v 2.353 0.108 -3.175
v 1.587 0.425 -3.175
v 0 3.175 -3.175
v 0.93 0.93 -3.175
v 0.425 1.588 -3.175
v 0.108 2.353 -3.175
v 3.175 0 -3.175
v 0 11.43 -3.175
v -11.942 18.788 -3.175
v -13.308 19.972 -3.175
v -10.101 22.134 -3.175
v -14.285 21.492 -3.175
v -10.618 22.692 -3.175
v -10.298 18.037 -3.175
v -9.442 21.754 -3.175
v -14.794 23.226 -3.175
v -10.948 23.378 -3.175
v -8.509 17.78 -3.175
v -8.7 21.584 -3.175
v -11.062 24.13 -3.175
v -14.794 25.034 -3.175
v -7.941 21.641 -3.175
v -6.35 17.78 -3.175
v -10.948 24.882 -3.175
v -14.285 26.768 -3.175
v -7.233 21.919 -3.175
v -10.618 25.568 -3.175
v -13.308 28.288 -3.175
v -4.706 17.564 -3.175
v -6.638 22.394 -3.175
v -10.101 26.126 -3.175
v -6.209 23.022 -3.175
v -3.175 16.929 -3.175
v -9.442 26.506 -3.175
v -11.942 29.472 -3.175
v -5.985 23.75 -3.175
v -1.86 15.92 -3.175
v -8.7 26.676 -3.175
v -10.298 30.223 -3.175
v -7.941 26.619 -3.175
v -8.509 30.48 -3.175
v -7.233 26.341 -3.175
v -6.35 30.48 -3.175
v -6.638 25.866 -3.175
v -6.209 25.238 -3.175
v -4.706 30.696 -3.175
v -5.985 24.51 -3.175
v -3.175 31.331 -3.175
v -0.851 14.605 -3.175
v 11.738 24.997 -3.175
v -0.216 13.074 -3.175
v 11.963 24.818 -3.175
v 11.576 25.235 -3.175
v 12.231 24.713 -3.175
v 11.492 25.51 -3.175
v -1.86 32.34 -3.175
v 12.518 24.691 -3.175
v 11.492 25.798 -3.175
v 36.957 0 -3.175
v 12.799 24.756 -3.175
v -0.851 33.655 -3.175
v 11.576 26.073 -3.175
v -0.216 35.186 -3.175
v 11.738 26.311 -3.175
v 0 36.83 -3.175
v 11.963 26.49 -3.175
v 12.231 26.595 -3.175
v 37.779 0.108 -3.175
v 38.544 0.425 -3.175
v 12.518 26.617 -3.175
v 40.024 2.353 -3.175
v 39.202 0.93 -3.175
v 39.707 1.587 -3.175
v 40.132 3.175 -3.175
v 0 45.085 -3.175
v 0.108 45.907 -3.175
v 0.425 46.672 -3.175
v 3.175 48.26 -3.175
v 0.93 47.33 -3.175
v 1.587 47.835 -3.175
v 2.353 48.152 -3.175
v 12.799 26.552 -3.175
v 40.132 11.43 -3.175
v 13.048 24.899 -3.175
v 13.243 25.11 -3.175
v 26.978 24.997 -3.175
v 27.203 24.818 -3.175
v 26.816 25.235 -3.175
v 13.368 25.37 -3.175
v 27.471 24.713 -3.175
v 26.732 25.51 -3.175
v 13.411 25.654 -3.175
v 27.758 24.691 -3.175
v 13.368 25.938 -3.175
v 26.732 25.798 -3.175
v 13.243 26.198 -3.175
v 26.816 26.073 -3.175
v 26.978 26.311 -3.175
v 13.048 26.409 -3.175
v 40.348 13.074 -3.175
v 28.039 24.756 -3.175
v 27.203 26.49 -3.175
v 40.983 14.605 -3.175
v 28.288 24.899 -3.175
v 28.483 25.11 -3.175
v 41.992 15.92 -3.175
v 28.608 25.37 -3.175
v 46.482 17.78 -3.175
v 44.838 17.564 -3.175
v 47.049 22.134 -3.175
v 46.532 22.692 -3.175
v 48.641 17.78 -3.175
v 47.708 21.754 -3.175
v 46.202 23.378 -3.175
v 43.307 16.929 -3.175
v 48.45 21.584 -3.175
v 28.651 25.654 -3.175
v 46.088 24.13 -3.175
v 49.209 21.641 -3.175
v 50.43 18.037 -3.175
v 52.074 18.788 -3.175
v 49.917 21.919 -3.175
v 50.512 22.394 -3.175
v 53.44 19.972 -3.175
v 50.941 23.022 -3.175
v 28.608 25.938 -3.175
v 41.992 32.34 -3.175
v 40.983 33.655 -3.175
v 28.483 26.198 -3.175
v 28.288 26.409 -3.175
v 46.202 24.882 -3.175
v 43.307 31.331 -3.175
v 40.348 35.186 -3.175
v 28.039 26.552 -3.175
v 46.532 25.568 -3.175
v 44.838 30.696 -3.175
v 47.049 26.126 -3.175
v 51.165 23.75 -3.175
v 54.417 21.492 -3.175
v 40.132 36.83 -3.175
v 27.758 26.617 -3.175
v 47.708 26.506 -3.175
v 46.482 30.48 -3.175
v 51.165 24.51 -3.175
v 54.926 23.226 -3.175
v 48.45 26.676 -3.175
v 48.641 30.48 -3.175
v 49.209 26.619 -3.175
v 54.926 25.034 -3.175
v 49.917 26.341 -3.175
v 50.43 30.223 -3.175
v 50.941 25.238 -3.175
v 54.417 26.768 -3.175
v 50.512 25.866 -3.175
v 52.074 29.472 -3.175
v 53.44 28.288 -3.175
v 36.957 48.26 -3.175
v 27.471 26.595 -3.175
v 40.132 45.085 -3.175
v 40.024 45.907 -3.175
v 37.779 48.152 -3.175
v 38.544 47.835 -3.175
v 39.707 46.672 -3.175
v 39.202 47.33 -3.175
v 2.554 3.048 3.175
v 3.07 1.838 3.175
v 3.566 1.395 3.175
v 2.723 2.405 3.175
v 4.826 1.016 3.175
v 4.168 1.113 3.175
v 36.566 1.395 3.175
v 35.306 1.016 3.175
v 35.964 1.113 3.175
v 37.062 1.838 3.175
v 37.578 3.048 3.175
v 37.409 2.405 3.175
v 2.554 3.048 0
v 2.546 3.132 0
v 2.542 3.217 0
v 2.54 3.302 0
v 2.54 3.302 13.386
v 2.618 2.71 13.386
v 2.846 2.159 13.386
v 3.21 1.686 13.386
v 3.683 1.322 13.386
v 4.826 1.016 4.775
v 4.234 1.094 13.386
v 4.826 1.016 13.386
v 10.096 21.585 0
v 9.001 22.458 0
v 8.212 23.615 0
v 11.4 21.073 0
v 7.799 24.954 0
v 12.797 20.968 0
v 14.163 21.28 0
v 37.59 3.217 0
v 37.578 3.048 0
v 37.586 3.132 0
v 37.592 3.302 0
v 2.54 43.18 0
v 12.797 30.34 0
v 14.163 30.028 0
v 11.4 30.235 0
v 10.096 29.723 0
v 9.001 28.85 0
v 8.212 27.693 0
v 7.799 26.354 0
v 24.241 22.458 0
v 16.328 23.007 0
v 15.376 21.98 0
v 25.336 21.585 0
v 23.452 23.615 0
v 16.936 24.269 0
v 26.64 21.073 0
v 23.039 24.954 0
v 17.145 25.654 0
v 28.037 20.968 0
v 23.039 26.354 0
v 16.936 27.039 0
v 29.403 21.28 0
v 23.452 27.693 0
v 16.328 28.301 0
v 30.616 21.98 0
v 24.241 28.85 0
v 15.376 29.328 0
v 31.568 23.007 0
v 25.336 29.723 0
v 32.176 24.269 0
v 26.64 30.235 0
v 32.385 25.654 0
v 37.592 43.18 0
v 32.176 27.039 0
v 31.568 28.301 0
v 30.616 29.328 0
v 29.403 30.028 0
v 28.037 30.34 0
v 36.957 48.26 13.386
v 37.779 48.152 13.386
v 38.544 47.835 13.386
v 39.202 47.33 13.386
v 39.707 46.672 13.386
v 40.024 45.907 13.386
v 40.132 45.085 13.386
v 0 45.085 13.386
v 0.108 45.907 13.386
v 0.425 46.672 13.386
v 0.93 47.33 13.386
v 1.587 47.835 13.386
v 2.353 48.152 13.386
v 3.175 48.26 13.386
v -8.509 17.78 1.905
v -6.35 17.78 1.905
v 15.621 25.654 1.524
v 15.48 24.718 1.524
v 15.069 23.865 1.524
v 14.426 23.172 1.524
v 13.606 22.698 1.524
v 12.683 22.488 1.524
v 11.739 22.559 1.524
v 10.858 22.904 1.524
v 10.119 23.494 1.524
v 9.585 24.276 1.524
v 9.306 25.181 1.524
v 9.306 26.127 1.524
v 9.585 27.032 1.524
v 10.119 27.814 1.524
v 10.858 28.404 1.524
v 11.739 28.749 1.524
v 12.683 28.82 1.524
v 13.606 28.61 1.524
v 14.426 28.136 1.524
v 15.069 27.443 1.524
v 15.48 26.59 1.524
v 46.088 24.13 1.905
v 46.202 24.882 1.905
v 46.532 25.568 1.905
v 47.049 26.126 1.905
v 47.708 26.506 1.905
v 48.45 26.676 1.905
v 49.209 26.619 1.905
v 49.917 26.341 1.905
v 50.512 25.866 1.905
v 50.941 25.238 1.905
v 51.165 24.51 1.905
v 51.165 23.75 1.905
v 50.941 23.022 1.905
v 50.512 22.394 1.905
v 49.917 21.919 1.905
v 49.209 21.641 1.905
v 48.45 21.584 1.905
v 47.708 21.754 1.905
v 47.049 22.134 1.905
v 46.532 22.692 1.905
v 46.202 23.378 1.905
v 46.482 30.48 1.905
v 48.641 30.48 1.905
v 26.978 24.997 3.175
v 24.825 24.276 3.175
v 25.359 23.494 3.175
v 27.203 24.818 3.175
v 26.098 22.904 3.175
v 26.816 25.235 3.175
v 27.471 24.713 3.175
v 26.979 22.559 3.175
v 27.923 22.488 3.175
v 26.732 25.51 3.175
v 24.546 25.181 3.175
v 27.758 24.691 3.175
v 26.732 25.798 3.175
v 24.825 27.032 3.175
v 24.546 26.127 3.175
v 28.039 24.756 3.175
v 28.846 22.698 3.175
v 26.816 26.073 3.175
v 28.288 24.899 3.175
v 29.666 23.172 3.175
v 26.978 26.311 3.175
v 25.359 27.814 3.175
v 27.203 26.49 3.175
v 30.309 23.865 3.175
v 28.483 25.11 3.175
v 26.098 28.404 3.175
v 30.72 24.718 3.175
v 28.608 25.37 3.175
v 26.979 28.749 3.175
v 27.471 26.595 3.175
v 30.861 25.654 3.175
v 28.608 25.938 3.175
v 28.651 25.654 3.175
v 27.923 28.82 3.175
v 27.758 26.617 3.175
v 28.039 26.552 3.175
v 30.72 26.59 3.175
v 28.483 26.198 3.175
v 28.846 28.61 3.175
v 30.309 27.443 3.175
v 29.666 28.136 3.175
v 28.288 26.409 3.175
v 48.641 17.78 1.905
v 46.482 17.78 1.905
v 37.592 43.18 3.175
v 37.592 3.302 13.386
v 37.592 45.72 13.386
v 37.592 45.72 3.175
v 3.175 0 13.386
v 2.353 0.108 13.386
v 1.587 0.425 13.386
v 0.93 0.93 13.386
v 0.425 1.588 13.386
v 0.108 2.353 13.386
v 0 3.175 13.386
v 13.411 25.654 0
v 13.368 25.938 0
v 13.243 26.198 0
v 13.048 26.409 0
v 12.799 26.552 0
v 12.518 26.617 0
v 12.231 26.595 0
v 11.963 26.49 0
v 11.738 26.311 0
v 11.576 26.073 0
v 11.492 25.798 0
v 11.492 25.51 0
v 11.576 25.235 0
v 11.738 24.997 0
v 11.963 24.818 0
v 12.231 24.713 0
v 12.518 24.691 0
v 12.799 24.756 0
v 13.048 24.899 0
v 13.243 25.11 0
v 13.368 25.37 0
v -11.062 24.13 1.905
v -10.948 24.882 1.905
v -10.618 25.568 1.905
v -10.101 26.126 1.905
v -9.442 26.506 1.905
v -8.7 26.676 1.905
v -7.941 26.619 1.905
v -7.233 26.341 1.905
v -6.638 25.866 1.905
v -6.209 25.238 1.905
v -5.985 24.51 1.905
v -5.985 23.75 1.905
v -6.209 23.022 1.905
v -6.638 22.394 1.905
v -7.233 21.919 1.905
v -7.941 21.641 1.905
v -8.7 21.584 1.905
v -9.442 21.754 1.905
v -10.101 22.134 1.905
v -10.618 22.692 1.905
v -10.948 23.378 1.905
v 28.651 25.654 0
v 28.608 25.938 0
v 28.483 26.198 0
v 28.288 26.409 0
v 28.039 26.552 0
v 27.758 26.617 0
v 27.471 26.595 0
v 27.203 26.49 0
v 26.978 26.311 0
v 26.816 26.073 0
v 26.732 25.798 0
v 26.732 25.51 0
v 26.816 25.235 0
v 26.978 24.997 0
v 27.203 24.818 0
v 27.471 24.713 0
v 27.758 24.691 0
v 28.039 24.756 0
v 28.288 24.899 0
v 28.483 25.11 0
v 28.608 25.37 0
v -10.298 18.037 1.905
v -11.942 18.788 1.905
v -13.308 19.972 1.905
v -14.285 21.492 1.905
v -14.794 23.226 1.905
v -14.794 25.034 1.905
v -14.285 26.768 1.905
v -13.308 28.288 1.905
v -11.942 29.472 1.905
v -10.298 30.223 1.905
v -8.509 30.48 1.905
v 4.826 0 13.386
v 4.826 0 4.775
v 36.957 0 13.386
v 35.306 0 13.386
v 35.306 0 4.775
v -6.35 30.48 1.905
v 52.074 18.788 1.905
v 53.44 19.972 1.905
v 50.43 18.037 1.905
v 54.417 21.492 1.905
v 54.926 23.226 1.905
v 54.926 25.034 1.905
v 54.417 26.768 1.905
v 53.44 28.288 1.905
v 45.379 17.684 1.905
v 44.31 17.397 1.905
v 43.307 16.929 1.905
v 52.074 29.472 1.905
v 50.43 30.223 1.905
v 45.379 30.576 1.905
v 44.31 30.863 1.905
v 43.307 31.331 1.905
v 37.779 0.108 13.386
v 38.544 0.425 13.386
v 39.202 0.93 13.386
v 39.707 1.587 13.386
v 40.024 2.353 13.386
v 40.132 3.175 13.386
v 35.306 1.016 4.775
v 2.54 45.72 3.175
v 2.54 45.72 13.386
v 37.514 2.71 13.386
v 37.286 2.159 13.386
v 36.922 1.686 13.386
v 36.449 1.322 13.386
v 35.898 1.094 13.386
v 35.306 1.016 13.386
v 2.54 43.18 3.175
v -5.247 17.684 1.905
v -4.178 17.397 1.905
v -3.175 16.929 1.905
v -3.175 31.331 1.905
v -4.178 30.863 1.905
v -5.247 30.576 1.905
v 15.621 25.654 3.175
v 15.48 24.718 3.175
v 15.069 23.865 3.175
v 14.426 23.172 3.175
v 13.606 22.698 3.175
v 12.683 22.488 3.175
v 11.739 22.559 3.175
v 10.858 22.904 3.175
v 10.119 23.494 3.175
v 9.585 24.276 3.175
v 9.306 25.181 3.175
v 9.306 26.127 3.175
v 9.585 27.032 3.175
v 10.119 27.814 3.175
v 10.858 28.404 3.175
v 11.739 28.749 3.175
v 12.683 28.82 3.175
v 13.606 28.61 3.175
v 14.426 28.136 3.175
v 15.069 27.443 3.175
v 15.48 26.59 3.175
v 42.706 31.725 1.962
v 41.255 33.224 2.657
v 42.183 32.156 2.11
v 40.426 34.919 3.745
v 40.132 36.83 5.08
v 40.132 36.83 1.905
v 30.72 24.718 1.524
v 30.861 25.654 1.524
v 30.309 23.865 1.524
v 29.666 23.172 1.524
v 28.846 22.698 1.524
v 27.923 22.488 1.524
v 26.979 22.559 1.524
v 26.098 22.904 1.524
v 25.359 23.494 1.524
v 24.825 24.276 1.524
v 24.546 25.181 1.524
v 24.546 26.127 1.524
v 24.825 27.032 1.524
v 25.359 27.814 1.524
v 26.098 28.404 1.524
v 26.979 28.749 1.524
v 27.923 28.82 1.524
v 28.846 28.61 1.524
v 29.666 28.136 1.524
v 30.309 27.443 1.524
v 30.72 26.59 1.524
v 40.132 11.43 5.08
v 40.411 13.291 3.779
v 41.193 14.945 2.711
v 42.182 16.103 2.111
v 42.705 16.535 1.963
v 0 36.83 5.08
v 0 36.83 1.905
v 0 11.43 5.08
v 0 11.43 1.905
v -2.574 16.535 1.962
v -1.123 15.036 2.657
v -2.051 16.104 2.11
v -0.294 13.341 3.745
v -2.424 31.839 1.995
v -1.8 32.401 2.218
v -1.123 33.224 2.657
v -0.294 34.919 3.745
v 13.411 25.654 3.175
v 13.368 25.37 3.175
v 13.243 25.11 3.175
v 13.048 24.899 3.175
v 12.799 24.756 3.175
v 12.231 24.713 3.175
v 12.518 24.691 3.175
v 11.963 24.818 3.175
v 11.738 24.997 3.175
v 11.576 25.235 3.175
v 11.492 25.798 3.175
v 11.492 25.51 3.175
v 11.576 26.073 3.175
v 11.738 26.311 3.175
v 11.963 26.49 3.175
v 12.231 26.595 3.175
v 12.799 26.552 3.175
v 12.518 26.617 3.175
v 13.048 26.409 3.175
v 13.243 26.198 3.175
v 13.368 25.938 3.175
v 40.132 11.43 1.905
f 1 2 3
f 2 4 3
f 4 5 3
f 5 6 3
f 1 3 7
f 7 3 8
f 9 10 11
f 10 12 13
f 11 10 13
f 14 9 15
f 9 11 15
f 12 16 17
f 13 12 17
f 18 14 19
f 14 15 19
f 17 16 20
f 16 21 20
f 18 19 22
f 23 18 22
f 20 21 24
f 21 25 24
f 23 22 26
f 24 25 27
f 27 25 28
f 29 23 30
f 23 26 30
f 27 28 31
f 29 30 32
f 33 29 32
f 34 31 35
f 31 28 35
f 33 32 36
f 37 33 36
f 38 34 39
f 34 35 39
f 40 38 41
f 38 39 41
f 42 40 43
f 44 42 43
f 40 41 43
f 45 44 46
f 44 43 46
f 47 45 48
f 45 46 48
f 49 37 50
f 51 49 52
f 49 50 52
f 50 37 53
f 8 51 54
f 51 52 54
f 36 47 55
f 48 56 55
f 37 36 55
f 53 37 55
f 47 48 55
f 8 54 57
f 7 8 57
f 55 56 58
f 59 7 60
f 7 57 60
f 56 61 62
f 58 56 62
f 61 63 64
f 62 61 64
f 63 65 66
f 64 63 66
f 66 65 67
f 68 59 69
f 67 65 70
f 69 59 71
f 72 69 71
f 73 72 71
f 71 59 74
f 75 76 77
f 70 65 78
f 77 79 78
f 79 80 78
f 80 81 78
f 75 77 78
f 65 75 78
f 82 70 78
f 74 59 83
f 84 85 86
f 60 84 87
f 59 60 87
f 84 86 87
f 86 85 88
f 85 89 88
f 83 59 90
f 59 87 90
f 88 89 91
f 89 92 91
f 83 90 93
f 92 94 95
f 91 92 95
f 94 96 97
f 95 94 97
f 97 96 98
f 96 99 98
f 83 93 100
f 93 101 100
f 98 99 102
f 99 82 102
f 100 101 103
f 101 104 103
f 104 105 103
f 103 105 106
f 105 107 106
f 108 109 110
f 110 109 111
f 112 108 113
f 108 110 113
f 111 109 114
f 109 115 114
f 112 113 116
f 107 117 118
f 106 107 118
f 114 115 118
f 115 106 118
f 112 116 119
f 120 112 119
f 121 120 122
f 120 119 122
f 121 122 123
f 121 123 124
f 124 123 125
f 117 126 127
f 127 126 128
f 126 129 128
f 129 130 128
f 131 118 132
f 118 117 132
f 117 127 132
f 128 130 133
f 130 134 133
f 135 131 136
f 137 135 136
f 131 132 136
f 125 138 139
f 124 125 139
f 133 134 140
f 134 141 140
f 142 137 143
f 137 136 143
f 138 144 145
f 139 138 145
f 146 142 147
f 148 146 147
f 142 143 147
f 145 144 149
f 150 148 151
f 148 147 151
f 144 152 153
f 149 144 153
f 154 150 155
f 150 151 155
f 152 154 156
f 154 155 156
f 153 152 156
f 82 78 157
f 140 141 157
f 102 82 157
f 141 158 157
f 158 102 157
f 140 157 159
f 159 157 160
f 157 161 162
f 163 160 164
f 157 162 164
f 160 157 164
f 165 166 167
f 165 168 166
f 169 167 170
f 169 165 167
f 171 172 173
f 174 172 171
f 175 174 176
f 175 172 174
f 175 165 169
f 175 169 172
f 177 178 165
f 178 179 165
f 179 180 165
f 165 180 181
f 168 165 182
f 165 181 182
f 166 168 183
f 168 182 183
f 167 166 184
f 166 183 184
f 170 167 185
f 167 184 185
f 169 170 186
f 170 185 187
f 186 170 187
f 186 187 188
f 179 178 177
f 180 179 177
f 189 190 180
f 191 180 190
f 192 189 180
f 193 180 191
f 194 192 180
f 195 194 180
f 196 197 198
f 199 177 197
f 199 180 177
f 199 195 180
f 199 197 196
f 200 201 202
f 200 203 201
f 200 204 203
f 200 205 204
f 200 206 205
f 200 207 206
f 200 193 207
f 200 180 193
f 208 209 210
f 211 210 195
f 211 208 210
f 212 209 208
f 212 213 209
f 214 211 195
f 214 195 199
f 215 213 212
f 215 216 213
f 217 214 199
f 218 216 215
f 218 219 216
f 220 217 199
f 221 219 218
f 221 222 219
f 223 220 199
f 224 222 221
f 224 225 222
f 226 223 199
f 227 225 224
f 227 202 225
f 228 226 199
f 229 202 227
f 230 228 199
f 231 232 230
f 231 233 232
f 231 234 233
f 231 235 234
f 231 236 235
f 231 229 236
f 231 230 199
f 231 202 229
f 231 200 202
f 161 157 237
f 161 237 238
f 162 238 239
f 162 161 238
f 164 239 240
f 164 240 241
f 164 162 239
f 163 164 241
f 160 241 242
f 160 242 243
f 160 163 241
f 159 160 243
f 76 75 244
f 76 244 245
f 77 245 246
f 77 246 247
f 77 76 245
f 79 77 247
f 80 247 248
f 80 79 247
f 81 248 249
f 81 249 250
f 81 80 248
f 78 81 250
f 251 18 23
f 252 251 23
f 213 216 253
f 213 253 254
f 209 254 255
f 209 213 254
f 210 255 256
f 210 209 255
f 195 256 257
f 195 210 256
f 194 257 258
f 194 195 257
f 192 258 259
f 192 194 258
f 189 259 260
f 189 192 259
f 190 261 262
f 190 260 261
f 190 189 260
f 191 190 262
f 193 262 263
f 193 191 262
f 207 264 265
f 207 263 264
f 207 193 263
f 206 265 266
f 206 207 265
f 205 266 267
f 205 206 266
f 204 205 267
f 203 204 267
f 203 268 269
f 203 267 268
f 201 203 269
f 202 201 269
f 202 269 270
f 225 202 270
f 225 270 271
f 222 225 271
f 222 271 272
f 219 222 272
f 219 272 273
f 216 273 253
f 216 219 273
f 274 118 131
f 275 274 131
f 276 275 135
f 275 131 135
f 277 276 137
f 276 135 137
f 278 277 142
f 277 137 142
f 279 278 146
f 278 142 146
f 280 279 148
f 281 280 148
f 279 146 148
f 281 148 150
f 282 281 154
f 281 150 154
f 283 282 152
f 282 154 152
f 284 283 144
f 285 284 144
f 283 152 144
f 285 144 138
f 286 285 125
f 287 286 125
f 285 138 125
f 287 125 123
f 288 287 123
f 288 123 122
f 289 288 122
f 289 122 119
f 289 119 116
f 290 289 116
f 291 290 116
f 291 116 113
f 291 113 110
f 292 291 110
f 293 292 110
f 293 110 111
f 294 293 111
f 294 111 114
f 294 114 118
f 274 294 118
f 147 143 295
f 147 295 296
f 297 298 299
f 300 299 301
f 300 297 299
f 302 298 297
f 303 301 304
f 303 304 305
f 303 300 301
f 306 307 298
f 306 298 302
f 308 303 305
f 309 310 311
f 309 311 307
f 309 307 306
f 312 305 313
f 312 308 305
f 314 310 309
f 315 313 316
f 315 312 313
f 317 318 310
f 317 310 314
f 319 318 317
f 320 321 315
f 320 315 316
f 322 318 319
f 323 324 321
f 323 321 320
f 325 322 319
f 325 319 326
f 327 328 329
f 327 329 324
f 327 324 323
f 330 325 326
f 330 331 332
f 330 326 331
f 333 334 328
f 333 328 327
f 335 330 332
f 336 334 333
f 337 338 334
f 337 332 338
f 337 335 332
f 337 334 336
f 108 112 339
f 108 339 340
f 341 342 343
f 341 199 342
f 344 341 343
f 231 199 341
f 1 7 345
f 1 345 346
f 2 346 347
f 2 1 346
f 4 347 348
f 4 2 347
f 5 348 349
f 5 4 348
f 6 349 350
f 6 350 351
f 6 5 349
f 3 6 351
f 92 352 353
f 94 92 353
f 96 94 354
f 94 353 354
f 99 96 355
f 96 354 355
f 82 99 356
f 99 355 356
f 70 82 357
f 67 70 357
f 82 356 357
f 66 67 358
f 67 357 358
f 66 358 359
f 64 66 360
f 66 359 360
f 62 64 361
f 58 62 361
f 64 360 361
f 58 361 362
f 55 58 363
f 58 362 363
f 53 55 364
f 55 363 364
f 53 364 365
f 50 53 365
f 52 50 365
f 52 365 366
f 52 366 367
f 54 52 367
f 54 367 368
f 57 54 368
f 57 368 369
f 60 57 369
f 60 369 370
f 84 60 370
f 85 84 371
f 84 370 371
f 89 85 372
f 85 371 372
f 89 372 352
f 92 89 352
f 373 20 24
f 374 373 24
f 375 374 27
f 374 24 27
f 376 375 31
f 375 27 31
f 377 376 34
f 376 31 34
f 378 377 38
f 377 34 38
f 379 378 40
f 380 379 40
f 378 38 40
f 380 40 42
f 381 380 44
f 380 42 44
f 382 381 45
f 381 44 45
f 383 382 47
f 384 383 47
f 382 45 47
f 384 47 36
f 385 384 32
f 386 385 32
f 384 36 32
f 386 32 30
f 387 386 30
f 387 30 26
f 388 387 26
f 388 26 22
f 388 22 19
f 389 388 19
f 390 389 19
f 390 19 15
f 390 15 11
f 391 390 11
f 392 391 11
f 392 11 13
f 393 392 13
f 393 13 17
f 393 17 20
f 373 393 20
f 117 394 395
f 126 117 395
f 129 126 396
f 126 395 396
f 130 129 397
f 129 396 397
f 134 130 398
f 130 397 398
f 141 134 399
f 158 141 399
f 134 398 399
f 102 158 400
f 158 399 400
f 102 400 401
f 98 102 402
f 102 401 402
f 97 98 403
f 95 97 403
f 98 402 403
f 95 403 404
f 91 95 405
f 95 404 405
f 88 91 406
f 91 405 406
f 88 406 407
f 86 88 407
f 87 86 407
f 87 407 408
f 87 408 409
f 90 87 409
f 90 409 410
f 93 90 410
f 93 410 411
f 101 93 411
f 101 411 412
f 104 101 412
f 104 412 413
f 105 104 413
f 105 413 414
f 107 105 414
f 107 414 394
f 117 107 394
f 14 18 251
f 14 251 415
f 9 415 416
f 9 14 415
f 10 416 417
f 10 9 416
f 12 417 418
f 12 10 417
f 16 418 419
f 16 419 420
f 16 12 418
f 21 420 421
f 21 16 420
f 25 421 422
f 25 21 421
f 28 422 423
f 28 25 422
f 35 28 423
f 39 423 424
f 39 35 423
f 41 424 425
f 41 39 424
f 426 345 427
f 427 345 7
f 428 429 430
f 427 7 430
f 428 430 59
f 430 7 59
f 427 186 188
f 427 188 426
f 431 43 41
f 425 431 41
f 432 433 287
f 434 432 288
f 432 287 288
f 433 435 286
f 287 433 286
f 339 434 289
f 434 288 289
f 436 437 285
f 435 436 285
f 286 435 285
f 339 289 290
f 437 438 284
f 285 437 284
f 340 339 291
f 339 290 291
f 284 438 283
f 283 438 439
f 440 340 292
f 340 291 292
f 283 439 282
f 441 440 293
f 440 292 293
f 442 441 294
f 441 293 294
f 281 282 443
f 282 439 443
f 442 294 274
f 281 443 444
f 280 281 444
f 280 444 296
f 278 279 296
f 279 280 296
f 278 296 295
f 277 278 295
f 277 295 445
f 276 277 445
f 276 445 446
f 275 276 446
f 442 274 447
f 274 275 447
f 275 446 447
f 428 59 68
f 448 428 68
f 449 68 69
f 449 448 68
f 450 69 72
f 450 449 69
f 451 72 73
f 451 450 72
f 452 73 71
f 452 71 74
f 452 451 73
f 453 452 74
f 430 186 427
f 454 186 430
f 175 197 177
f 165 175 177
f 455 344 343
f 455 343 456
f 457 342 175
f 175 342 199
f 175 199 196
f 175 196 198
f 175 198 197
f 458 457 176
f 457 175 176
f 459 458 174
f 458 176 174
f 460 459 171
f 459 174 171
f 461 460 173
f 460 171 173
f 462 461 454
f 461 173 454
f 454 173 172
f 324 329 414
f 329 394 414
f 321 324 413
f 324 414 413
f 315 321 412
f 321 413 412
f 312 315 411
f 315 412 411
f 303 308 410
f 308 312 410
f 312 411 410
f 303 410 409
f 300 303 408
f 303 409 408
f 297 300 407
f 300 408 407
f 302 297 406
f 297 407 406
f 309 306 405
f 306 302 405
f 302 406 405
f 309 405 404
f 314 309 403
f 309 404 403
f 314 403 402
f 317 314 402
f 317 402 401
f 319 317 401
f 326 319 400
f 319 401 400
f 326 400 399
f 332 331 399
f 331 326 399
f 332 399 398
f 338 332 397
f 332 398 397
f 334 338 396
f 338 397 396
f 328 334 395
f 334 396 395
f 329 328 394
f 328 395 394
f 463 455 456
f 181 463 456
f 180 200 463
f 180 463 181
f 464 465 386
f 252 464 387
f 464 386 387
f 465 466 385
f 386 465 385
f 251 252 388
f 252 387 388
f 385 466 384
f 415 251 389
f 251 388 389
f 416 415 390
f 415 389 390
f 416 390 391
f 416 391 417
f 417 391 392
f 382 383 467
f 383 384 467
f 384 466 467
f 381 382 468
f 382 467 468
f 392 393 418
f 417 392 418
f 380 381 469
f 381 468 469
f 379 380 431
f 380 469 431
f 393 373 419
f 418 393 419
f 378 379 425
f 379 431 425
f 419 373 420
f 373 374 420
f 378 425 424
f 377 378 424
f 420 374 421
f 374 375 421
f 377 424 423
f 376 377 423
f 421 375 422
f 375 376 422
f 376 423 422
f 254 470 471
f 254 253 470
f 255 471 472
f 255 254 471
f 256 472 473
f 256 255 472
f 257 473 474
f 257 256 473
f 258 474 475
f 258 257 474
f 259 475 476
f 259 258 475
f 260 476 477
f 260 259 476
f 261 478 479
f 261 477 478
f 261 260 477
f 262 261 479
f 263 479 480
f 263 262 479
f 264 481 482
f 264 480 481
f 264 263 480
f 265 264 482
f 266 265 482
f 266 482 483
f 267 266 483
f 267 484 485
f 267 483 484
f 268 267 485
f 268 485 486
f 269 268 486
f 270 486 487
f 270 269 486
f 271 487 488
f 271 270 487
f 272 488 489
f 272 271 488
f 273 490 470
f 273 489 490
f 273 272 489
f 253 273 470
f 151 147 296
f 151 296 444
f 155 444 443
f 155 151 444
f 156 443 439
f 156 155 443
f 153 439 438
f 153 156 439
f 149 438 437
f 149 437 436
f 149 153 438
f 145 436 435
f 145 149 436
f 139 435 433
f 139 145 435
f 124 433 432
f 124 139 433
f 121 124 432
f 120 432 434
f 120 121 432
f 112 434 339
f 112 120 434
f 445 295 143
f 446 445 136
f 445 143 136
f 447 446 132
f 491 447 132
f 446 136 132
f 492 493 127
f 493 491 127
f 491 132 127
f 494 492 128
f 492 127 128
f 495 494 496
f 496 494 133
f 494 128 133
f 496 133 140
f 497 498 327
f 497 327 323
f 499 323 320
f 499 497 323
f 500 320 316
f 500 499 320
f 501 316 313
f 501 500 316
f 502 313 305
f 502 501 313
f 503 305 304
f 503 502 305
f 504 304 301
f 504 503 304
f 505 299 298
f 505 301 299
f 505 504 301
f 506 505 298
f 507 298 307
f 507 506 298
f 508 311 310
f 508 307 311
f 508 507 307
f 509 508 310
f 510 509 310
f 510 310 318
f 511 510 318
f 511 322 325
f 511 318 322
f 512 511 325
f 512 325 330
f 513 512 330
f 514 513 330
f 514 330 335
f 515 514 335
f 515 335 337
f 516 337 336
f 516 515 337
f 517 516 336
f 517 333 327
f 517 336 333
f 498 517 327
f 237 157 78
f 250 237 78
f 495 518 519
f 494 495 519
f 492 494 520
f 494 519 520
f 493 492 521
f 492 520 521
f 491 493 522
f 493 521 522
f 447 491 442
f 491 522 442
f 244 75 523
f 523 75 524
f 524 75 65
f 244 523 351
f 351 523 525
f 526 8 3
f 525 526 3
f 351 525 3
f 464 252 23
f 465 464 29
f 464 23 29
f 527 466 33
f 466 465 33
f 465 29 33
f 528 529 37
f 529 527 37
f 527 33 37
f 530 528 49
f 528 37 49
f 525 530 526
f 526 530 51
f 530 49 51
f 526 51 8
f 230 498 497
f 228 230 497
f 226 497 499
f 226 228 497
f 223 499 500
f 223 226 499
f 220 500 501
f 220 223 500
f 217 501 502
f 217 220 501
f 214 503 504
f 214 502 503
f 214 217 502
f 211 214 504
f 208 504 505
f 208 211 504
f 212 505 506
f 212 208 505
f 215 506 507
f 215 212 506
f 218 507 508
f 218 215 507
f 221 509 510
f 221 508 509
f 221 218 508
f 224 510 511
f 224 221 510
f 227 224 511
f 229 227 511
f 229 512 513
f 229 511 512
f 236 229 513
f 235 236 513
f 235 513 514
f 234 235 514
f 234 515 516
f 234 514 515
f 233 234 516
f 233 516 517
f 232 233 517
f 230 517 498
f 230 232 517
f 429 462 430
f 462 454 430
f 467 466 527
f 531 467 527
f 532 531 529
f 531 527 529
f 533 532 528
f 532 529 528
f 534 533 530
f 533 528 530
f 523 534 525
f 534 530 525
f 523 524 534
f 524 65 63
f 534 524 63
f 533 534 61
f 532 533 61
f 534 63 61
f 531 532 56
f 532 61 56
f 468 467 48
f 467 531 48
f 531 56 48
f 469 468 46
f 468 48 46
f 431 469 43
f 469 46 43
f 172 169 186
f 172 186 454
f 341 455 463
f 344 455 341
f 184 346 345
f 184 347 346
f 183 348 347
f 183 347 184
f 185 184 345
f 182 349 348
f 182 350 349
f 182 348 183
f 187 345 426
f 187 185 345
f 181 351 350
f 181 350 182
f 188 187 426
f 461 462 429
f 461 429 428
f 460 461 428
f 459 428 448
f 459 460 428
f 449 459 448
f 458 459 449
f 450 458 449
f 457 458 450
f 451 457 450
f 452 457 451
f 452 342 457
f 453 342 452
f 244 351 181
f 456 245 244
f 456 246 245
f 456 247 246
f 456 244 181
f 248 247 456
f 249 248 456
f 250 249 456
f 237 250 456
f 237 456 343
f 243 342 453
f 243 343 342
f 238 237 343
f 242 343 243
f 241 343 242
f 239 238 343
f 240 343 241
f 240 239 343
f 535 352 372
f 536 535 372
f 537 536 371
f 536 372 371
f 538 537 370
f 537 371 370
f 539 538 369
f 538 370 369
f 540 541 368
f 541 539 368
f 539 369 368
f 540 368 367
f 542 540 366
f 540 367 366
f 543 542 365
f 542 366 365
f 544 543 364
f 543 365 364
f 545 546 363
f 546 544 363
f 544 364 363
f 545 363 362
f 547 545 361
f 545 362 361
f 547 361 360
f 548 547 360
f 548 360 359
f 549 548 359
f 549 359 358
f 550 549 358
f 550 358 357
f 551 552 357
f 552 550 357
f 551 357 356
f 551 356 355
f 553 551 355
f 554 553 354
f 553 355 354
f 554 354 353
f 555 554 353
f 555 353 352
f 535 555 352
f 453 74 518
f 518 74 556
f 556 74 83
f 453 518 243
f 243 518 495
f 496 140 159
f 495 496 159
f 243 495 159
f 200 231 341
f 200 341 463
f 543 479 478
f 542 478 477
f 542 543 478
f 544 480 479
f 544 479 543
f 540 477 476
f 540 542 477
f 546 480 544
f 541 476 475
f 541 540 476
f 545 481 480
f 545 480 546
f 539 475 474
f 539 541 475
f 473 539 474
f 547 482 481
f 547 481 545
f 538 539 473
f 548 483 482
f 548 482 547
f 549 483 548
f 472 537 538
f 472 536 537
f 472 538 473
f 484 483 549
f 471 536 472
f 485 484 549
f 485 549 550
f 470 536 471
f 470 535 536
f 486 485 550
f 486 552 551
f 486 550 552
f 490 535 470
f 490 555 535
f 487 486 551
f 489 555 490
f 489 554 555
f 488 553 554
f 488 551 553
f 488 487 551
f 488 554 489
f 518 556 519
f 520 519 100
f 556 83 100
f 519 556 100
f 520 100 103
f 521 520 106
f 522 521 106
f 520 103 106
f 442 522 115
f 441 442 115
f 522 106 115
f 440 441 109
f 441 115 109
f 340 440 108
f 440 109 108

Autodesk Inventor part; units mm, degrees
ref_plane "YZ Plane" through (0, 0, 0) normal (1, 0, 0) x (0, 1, 0)
ref_plane "XZ Plane" through (0, 0, 0) normal (0, 1, 0) x (-1, 0, 0)
ref_plane "XY Plane" through (0, 0, 0) normal (0, 0, 1) x (1, 0, 0)
sketch "Sketch1" plane through (0, 0, 0) normal (0, 0, 1) x (1, 0, 0)
  line L0 (0, 0) -> (40.132, 0)
  line L1 (40.132, 0) -> (40.132, 48.26)
  line L2 (40.132, 48.26) -> (0, 48.26)
  line L3 (0, 48.26) -> (0, 0)
  line L4 (3.556, 44.704) -> (36.576, 44.704) construction
  line L5 (36.576, 44.704) -> (36.576, 1.524) construction
  line L6 (36.576, 1.524) -> (3.556, 1.524) construction
  line L7 (3.556, 1.524) -> (3.556, 44.704) construction
  line L8 (37.592, 1.016) -> (37.592, 45.72)
  line L9 (37.592, 45.72) -> (2.54, 45.72)
  line L10 (2.54, 45.72) -> (2.54, 1.016)
  line L11 (2.54, 1.016) -> (37.592, 1.016) construction
  line L12 (2.54, 1.016) -> (2.54, 0)
  line L13 (37.592, 1.016) -> (37.592, 0)
  line L14 (12.446, 25.654) -> (27.686, 25.654)
  point P0 (20.066, 48.26)
  point P1 (20.066, 44.704)
  point P2 (3.556, 23.114)
  point P3 (0, 24.13)
  point P4 (20.066, 25.654)
  dimension "d2" = 33.02
  dimension "d3" = 43.18
  dimension "d4" = 1.524
  dimension "d8" = 2.54
  dimension "d9" = 1.016
  dimension "d14" = 15.24
  dimension "d15" = 19.05
  dimension "d34" = 1.016
  dimension "d35" = 1.016
extrude "Extrusion1" add sketch "Sketch1" against normal blind 3.175
sketch "Sketch2" plane through (0, 0, 0) normal (0, 0, 1) x (1, 0, 0)
  line L0 (2.54, 1.016) -> (2.54, 0) projected
  line L1 (0, 48.26) -> (0, 0) projected
  line L2 (2.54, 45.72) -> (2.54, 1.016) projected
  line L3 (37.592, 45.72) -> (2.54, 45.72) projected
  line L4 (40.132, 48.26) -> (0, 48.26) projected
  line L5 (40.132, 0) -> (40.132, 48.26) projected
  line L6 (37.592, 1.016) -> (37.592, 0) projected
  line L7 (37.592, 1.016) -> (37.592, 45.72) projected
  line L8 (0, 0) -> (2.54, 0)
  line L9 (37.592, 0) -> (40.132, 0)
extrude "Extrusion2" add sketch "Sketch2" along normal blind 13.3856
sketch "Sketch3" plane through (0, 0, 0) normal (0, 0, 1) x (1, 0, 0)
  line L0 (2.54, 1.016) -> (37.592, 1.016) projected
  line L1 (2.54, 0) -> (37.592, 0) projected
  line L2 (2.54, 0) -> (2.54, 45.72) projected
  line L3 (37.592, 45.72) -> (37.592, 0) projected
  point P0 (0, 0)
extrude "Extrusion3" add sketch "Sketch3" along normal blind 4.775
sketch "Sketch4" plane through (0, 0, 0) normal (0, 0, 1) x (1, 0, 0)
  circle A0 centre (12.446, 25.654) radius 3.175
  circle A1 centre (27.686, 25.654) radius 3.175
  circle A2 centre (12.446, 25.654) radius 0.9652
  circle A3 centre (27.686, 25.654) radius 0.9652
  point P0 (0, 0)
  dimension "d16" = 6.35
  dimension "d18" = 1.9304
extrude "Extrusion4" add sketch "Sketch4" along normal blind 3.175
extrude "Extrusion8" cut sketch "Sketch4" against normal through all contours A2 | A3
sketch "Sketch5" plane through (0, 0, 0) normal (0, 0, 1) x (1, 0, 0)
  circle A0 centre (12.446, 25.654) radius 3.175 construction
  circle A1 centre (27.686, 25.654) radius 3.175 construction
  line L0 (2.54, 1.016) -> (37.592, 1.016) construction
  line L1 (37.592, 1.016) -> (37.592, 45.72) construction
  line L2 (37.592, 45.72) -> (2.54, 45.72) construction
  line L3 (2.54, 45.72) -> (2.54, 1.016) construction
  line L4 (3.556, 44.704) -> (36.576, 44.704) construction
  line L5 (3.556, 1.524) -> (3.556, 44.704) construction
  line L6 (36.576, 44.704) -> (36.576, 1.524) construction
  line L7 (36.576, 1.524) -> (3.556, 1.524) construction
  line L8 (2.54, 1.016) -> (37.592, 1.016)
  line L9 (37.592, 1.016) -> (37.592, 3.048)
  line L10 (37.592, 3.048) -> (2.54, 3.048)
  line L11 (2.54, 3.048) -> (2.54, 1.016)
  line L12 (2.54, 45.72) -> (37.592, 45.72)
  line L13 (37.592, 45.72) -> (37.592, 43.18)
  line L14 (37.592, 43.18) -> (2.54, 43.18)
  line L15 (2.54, 43.18) -> (2.54, 45.72)
  point P0 (0, 0)
  dimension "d21" = 1.524
  dimension "d25" = 1.524
extrude "Extrusion5" add sketch "Sketch5" along normal blind 3.175
sketch "Sketch6" plane through (0, 0, 4.775) normal (0, 0, 1) x (1, 0, 0)
  line L0 (40.132, 0) -> (0, 0) construction
  line L1 (4.826, 0) -> (2.54, 0)
  line L2 (2.54, 0) -> (2.54, 1.016)
  line L3 (2.54, 1.016) -> (4.826, 1.016)
  line L4 (4.826, 1.016) -> (4.826, 0)
  line L5 (2.54, 0) -> (2.54, 45.72) projected
  line L6 (37.592, 1.016) -> (2.54, 1.016) construction
  line L7 (35.306, 0) -> (37.592, 0)
  line L8 (37.592, 0) -> (37.592, 1.016)
  line L9 (37.592, 1.016) -> (35.306, 1.016)
  line L10 (35.306, 1.016) -> (35.306, 0)
  dimension "d26" = 2.286
  dimension "d27" = 2.286
extrude "Extrusion6" add sketch "Sketch6" along normal up to surface (8.6106 mm away)
fillet "Fillet1" radius 2.286 2 edges at (37.592, 1.016, 8.2803) (2.54, 1.016, 8.2803)
chamfer "Chamfer2" distance 1.524 angle 45 2 edges at (9.271, 25.654, 0) (24.511, 25.654, 0)
fillet "Fillet2" radius 3.175 4 edges at (0, 0, 5.1053) (40.132, 0, 5.1053) (40.132, 48.26, 5.1053) (0, 48.26, 5.1053)
sketch "Sketch7" plane through (0, 0, -3.175) normal (0, 0, -1) x (-1, 0, 0)
  circle A0 centre (8.509, 24.13) radius 2.5527
  line L0 (-3.175, 48.26) -> (-36.957, 48.26) construction
  line L1 (-40.132, 45.085) -> (-40.132, 3.175) construction
  line L2 (-36.957, 0) -> (-3.175, 0) construction
  line L3 (0, 3.175) -> (0, 45.085) construction
  line L4 (-40.132, 48.26) -> (0, 48.26) construction
  line L5 (-20.066, 48.26) -> (-20.066, 0) construction
  arc A1 (0, 36.83) -> (6.35, 30.48) centre (6.35, 36.83) ccw
  arc A2 (6.35, 17.78) -> (0, 11.43) centre (6.35, 11.43) ccw
  line L6 (6.35, 30.48) -> (8.509, 30.48)
  arc A3 (8.509, 17.78) -> (8.509, 30.48) centre (8.509, 24.13) ccw
  line L7 (8.509, 17.78) -> (6.35, 17.78)
  line L8 (0, 36.83) -> (0, 11.43)
  line L9 (0, 0) -> (0, 48.26) projected
  circle A4 centre (-48.641, 24.13) radius 2.5527
  arc A5 (-46.482, 30.48) -> (-40.132, 36.83) centre (-46.482, 36.83) ccw
  arc A6 (-40.132, 11.43) -> (-46.482, 17.78) centre (-46.482, 11.43) ccw
  line L10 (-46.482, 30.48) -> (-48.641, 30.48)
  arc A7 (-48.641, 30.48) -> (-48.641, 17.78) centre (-48.641, 24.13) ccw
  line L11 (-48.641, 17.78) -> (-46.482, 17.78)
  line L12 (-40.132, 36.83) -> (-40.132, 11.43)
  arc A8 (0, 45.085) -> (-3.175, 48.26) centre (-3.175, 45.085) ccw projected
  arc A9 (-36.957, 48.26) -> (-40.132, 45.085) centre (-36.957, 45.085) ccw projected
  arc A10 (-40.132, 3.175) -> (-36.957, 0) centre (-36.957, 3.175) ccw projected
  arc A11 (-3.175, 0) -> (0, 3.175) centre (-3.175, 3.175) ccw projected
  point P0 (-3.175, 48.26)
  point P1 (0, 24.13)
  point P2 (-40.132, 24.13)
  dimension "d40" = 5.1054
  dimension "d41" = 6.35
  dimension "d43" = 6.35
  dimension "d44" = 57.15
extrude "Extrusion7" add sketch "Sketch7" against normal blind 5.08
fillet "Fillet3" radius 3.175 2 edges at (40.132, 24.13, 1.905) (0, 24.13, 1.905)
equation "\"d12\" = BoardOffset + PCBThickness"
equation "\"d19\" = BoardOffset"
equation "\"d23\" = BoardOffset"
equation "\"d27\" = d26"
equation "\"d28\" = BoardOffset"
equation "\"PCBThickness\" = 1.6"
equation "\"BoardOffset\" = 3.175"
properties part number "TOF Case P1"
